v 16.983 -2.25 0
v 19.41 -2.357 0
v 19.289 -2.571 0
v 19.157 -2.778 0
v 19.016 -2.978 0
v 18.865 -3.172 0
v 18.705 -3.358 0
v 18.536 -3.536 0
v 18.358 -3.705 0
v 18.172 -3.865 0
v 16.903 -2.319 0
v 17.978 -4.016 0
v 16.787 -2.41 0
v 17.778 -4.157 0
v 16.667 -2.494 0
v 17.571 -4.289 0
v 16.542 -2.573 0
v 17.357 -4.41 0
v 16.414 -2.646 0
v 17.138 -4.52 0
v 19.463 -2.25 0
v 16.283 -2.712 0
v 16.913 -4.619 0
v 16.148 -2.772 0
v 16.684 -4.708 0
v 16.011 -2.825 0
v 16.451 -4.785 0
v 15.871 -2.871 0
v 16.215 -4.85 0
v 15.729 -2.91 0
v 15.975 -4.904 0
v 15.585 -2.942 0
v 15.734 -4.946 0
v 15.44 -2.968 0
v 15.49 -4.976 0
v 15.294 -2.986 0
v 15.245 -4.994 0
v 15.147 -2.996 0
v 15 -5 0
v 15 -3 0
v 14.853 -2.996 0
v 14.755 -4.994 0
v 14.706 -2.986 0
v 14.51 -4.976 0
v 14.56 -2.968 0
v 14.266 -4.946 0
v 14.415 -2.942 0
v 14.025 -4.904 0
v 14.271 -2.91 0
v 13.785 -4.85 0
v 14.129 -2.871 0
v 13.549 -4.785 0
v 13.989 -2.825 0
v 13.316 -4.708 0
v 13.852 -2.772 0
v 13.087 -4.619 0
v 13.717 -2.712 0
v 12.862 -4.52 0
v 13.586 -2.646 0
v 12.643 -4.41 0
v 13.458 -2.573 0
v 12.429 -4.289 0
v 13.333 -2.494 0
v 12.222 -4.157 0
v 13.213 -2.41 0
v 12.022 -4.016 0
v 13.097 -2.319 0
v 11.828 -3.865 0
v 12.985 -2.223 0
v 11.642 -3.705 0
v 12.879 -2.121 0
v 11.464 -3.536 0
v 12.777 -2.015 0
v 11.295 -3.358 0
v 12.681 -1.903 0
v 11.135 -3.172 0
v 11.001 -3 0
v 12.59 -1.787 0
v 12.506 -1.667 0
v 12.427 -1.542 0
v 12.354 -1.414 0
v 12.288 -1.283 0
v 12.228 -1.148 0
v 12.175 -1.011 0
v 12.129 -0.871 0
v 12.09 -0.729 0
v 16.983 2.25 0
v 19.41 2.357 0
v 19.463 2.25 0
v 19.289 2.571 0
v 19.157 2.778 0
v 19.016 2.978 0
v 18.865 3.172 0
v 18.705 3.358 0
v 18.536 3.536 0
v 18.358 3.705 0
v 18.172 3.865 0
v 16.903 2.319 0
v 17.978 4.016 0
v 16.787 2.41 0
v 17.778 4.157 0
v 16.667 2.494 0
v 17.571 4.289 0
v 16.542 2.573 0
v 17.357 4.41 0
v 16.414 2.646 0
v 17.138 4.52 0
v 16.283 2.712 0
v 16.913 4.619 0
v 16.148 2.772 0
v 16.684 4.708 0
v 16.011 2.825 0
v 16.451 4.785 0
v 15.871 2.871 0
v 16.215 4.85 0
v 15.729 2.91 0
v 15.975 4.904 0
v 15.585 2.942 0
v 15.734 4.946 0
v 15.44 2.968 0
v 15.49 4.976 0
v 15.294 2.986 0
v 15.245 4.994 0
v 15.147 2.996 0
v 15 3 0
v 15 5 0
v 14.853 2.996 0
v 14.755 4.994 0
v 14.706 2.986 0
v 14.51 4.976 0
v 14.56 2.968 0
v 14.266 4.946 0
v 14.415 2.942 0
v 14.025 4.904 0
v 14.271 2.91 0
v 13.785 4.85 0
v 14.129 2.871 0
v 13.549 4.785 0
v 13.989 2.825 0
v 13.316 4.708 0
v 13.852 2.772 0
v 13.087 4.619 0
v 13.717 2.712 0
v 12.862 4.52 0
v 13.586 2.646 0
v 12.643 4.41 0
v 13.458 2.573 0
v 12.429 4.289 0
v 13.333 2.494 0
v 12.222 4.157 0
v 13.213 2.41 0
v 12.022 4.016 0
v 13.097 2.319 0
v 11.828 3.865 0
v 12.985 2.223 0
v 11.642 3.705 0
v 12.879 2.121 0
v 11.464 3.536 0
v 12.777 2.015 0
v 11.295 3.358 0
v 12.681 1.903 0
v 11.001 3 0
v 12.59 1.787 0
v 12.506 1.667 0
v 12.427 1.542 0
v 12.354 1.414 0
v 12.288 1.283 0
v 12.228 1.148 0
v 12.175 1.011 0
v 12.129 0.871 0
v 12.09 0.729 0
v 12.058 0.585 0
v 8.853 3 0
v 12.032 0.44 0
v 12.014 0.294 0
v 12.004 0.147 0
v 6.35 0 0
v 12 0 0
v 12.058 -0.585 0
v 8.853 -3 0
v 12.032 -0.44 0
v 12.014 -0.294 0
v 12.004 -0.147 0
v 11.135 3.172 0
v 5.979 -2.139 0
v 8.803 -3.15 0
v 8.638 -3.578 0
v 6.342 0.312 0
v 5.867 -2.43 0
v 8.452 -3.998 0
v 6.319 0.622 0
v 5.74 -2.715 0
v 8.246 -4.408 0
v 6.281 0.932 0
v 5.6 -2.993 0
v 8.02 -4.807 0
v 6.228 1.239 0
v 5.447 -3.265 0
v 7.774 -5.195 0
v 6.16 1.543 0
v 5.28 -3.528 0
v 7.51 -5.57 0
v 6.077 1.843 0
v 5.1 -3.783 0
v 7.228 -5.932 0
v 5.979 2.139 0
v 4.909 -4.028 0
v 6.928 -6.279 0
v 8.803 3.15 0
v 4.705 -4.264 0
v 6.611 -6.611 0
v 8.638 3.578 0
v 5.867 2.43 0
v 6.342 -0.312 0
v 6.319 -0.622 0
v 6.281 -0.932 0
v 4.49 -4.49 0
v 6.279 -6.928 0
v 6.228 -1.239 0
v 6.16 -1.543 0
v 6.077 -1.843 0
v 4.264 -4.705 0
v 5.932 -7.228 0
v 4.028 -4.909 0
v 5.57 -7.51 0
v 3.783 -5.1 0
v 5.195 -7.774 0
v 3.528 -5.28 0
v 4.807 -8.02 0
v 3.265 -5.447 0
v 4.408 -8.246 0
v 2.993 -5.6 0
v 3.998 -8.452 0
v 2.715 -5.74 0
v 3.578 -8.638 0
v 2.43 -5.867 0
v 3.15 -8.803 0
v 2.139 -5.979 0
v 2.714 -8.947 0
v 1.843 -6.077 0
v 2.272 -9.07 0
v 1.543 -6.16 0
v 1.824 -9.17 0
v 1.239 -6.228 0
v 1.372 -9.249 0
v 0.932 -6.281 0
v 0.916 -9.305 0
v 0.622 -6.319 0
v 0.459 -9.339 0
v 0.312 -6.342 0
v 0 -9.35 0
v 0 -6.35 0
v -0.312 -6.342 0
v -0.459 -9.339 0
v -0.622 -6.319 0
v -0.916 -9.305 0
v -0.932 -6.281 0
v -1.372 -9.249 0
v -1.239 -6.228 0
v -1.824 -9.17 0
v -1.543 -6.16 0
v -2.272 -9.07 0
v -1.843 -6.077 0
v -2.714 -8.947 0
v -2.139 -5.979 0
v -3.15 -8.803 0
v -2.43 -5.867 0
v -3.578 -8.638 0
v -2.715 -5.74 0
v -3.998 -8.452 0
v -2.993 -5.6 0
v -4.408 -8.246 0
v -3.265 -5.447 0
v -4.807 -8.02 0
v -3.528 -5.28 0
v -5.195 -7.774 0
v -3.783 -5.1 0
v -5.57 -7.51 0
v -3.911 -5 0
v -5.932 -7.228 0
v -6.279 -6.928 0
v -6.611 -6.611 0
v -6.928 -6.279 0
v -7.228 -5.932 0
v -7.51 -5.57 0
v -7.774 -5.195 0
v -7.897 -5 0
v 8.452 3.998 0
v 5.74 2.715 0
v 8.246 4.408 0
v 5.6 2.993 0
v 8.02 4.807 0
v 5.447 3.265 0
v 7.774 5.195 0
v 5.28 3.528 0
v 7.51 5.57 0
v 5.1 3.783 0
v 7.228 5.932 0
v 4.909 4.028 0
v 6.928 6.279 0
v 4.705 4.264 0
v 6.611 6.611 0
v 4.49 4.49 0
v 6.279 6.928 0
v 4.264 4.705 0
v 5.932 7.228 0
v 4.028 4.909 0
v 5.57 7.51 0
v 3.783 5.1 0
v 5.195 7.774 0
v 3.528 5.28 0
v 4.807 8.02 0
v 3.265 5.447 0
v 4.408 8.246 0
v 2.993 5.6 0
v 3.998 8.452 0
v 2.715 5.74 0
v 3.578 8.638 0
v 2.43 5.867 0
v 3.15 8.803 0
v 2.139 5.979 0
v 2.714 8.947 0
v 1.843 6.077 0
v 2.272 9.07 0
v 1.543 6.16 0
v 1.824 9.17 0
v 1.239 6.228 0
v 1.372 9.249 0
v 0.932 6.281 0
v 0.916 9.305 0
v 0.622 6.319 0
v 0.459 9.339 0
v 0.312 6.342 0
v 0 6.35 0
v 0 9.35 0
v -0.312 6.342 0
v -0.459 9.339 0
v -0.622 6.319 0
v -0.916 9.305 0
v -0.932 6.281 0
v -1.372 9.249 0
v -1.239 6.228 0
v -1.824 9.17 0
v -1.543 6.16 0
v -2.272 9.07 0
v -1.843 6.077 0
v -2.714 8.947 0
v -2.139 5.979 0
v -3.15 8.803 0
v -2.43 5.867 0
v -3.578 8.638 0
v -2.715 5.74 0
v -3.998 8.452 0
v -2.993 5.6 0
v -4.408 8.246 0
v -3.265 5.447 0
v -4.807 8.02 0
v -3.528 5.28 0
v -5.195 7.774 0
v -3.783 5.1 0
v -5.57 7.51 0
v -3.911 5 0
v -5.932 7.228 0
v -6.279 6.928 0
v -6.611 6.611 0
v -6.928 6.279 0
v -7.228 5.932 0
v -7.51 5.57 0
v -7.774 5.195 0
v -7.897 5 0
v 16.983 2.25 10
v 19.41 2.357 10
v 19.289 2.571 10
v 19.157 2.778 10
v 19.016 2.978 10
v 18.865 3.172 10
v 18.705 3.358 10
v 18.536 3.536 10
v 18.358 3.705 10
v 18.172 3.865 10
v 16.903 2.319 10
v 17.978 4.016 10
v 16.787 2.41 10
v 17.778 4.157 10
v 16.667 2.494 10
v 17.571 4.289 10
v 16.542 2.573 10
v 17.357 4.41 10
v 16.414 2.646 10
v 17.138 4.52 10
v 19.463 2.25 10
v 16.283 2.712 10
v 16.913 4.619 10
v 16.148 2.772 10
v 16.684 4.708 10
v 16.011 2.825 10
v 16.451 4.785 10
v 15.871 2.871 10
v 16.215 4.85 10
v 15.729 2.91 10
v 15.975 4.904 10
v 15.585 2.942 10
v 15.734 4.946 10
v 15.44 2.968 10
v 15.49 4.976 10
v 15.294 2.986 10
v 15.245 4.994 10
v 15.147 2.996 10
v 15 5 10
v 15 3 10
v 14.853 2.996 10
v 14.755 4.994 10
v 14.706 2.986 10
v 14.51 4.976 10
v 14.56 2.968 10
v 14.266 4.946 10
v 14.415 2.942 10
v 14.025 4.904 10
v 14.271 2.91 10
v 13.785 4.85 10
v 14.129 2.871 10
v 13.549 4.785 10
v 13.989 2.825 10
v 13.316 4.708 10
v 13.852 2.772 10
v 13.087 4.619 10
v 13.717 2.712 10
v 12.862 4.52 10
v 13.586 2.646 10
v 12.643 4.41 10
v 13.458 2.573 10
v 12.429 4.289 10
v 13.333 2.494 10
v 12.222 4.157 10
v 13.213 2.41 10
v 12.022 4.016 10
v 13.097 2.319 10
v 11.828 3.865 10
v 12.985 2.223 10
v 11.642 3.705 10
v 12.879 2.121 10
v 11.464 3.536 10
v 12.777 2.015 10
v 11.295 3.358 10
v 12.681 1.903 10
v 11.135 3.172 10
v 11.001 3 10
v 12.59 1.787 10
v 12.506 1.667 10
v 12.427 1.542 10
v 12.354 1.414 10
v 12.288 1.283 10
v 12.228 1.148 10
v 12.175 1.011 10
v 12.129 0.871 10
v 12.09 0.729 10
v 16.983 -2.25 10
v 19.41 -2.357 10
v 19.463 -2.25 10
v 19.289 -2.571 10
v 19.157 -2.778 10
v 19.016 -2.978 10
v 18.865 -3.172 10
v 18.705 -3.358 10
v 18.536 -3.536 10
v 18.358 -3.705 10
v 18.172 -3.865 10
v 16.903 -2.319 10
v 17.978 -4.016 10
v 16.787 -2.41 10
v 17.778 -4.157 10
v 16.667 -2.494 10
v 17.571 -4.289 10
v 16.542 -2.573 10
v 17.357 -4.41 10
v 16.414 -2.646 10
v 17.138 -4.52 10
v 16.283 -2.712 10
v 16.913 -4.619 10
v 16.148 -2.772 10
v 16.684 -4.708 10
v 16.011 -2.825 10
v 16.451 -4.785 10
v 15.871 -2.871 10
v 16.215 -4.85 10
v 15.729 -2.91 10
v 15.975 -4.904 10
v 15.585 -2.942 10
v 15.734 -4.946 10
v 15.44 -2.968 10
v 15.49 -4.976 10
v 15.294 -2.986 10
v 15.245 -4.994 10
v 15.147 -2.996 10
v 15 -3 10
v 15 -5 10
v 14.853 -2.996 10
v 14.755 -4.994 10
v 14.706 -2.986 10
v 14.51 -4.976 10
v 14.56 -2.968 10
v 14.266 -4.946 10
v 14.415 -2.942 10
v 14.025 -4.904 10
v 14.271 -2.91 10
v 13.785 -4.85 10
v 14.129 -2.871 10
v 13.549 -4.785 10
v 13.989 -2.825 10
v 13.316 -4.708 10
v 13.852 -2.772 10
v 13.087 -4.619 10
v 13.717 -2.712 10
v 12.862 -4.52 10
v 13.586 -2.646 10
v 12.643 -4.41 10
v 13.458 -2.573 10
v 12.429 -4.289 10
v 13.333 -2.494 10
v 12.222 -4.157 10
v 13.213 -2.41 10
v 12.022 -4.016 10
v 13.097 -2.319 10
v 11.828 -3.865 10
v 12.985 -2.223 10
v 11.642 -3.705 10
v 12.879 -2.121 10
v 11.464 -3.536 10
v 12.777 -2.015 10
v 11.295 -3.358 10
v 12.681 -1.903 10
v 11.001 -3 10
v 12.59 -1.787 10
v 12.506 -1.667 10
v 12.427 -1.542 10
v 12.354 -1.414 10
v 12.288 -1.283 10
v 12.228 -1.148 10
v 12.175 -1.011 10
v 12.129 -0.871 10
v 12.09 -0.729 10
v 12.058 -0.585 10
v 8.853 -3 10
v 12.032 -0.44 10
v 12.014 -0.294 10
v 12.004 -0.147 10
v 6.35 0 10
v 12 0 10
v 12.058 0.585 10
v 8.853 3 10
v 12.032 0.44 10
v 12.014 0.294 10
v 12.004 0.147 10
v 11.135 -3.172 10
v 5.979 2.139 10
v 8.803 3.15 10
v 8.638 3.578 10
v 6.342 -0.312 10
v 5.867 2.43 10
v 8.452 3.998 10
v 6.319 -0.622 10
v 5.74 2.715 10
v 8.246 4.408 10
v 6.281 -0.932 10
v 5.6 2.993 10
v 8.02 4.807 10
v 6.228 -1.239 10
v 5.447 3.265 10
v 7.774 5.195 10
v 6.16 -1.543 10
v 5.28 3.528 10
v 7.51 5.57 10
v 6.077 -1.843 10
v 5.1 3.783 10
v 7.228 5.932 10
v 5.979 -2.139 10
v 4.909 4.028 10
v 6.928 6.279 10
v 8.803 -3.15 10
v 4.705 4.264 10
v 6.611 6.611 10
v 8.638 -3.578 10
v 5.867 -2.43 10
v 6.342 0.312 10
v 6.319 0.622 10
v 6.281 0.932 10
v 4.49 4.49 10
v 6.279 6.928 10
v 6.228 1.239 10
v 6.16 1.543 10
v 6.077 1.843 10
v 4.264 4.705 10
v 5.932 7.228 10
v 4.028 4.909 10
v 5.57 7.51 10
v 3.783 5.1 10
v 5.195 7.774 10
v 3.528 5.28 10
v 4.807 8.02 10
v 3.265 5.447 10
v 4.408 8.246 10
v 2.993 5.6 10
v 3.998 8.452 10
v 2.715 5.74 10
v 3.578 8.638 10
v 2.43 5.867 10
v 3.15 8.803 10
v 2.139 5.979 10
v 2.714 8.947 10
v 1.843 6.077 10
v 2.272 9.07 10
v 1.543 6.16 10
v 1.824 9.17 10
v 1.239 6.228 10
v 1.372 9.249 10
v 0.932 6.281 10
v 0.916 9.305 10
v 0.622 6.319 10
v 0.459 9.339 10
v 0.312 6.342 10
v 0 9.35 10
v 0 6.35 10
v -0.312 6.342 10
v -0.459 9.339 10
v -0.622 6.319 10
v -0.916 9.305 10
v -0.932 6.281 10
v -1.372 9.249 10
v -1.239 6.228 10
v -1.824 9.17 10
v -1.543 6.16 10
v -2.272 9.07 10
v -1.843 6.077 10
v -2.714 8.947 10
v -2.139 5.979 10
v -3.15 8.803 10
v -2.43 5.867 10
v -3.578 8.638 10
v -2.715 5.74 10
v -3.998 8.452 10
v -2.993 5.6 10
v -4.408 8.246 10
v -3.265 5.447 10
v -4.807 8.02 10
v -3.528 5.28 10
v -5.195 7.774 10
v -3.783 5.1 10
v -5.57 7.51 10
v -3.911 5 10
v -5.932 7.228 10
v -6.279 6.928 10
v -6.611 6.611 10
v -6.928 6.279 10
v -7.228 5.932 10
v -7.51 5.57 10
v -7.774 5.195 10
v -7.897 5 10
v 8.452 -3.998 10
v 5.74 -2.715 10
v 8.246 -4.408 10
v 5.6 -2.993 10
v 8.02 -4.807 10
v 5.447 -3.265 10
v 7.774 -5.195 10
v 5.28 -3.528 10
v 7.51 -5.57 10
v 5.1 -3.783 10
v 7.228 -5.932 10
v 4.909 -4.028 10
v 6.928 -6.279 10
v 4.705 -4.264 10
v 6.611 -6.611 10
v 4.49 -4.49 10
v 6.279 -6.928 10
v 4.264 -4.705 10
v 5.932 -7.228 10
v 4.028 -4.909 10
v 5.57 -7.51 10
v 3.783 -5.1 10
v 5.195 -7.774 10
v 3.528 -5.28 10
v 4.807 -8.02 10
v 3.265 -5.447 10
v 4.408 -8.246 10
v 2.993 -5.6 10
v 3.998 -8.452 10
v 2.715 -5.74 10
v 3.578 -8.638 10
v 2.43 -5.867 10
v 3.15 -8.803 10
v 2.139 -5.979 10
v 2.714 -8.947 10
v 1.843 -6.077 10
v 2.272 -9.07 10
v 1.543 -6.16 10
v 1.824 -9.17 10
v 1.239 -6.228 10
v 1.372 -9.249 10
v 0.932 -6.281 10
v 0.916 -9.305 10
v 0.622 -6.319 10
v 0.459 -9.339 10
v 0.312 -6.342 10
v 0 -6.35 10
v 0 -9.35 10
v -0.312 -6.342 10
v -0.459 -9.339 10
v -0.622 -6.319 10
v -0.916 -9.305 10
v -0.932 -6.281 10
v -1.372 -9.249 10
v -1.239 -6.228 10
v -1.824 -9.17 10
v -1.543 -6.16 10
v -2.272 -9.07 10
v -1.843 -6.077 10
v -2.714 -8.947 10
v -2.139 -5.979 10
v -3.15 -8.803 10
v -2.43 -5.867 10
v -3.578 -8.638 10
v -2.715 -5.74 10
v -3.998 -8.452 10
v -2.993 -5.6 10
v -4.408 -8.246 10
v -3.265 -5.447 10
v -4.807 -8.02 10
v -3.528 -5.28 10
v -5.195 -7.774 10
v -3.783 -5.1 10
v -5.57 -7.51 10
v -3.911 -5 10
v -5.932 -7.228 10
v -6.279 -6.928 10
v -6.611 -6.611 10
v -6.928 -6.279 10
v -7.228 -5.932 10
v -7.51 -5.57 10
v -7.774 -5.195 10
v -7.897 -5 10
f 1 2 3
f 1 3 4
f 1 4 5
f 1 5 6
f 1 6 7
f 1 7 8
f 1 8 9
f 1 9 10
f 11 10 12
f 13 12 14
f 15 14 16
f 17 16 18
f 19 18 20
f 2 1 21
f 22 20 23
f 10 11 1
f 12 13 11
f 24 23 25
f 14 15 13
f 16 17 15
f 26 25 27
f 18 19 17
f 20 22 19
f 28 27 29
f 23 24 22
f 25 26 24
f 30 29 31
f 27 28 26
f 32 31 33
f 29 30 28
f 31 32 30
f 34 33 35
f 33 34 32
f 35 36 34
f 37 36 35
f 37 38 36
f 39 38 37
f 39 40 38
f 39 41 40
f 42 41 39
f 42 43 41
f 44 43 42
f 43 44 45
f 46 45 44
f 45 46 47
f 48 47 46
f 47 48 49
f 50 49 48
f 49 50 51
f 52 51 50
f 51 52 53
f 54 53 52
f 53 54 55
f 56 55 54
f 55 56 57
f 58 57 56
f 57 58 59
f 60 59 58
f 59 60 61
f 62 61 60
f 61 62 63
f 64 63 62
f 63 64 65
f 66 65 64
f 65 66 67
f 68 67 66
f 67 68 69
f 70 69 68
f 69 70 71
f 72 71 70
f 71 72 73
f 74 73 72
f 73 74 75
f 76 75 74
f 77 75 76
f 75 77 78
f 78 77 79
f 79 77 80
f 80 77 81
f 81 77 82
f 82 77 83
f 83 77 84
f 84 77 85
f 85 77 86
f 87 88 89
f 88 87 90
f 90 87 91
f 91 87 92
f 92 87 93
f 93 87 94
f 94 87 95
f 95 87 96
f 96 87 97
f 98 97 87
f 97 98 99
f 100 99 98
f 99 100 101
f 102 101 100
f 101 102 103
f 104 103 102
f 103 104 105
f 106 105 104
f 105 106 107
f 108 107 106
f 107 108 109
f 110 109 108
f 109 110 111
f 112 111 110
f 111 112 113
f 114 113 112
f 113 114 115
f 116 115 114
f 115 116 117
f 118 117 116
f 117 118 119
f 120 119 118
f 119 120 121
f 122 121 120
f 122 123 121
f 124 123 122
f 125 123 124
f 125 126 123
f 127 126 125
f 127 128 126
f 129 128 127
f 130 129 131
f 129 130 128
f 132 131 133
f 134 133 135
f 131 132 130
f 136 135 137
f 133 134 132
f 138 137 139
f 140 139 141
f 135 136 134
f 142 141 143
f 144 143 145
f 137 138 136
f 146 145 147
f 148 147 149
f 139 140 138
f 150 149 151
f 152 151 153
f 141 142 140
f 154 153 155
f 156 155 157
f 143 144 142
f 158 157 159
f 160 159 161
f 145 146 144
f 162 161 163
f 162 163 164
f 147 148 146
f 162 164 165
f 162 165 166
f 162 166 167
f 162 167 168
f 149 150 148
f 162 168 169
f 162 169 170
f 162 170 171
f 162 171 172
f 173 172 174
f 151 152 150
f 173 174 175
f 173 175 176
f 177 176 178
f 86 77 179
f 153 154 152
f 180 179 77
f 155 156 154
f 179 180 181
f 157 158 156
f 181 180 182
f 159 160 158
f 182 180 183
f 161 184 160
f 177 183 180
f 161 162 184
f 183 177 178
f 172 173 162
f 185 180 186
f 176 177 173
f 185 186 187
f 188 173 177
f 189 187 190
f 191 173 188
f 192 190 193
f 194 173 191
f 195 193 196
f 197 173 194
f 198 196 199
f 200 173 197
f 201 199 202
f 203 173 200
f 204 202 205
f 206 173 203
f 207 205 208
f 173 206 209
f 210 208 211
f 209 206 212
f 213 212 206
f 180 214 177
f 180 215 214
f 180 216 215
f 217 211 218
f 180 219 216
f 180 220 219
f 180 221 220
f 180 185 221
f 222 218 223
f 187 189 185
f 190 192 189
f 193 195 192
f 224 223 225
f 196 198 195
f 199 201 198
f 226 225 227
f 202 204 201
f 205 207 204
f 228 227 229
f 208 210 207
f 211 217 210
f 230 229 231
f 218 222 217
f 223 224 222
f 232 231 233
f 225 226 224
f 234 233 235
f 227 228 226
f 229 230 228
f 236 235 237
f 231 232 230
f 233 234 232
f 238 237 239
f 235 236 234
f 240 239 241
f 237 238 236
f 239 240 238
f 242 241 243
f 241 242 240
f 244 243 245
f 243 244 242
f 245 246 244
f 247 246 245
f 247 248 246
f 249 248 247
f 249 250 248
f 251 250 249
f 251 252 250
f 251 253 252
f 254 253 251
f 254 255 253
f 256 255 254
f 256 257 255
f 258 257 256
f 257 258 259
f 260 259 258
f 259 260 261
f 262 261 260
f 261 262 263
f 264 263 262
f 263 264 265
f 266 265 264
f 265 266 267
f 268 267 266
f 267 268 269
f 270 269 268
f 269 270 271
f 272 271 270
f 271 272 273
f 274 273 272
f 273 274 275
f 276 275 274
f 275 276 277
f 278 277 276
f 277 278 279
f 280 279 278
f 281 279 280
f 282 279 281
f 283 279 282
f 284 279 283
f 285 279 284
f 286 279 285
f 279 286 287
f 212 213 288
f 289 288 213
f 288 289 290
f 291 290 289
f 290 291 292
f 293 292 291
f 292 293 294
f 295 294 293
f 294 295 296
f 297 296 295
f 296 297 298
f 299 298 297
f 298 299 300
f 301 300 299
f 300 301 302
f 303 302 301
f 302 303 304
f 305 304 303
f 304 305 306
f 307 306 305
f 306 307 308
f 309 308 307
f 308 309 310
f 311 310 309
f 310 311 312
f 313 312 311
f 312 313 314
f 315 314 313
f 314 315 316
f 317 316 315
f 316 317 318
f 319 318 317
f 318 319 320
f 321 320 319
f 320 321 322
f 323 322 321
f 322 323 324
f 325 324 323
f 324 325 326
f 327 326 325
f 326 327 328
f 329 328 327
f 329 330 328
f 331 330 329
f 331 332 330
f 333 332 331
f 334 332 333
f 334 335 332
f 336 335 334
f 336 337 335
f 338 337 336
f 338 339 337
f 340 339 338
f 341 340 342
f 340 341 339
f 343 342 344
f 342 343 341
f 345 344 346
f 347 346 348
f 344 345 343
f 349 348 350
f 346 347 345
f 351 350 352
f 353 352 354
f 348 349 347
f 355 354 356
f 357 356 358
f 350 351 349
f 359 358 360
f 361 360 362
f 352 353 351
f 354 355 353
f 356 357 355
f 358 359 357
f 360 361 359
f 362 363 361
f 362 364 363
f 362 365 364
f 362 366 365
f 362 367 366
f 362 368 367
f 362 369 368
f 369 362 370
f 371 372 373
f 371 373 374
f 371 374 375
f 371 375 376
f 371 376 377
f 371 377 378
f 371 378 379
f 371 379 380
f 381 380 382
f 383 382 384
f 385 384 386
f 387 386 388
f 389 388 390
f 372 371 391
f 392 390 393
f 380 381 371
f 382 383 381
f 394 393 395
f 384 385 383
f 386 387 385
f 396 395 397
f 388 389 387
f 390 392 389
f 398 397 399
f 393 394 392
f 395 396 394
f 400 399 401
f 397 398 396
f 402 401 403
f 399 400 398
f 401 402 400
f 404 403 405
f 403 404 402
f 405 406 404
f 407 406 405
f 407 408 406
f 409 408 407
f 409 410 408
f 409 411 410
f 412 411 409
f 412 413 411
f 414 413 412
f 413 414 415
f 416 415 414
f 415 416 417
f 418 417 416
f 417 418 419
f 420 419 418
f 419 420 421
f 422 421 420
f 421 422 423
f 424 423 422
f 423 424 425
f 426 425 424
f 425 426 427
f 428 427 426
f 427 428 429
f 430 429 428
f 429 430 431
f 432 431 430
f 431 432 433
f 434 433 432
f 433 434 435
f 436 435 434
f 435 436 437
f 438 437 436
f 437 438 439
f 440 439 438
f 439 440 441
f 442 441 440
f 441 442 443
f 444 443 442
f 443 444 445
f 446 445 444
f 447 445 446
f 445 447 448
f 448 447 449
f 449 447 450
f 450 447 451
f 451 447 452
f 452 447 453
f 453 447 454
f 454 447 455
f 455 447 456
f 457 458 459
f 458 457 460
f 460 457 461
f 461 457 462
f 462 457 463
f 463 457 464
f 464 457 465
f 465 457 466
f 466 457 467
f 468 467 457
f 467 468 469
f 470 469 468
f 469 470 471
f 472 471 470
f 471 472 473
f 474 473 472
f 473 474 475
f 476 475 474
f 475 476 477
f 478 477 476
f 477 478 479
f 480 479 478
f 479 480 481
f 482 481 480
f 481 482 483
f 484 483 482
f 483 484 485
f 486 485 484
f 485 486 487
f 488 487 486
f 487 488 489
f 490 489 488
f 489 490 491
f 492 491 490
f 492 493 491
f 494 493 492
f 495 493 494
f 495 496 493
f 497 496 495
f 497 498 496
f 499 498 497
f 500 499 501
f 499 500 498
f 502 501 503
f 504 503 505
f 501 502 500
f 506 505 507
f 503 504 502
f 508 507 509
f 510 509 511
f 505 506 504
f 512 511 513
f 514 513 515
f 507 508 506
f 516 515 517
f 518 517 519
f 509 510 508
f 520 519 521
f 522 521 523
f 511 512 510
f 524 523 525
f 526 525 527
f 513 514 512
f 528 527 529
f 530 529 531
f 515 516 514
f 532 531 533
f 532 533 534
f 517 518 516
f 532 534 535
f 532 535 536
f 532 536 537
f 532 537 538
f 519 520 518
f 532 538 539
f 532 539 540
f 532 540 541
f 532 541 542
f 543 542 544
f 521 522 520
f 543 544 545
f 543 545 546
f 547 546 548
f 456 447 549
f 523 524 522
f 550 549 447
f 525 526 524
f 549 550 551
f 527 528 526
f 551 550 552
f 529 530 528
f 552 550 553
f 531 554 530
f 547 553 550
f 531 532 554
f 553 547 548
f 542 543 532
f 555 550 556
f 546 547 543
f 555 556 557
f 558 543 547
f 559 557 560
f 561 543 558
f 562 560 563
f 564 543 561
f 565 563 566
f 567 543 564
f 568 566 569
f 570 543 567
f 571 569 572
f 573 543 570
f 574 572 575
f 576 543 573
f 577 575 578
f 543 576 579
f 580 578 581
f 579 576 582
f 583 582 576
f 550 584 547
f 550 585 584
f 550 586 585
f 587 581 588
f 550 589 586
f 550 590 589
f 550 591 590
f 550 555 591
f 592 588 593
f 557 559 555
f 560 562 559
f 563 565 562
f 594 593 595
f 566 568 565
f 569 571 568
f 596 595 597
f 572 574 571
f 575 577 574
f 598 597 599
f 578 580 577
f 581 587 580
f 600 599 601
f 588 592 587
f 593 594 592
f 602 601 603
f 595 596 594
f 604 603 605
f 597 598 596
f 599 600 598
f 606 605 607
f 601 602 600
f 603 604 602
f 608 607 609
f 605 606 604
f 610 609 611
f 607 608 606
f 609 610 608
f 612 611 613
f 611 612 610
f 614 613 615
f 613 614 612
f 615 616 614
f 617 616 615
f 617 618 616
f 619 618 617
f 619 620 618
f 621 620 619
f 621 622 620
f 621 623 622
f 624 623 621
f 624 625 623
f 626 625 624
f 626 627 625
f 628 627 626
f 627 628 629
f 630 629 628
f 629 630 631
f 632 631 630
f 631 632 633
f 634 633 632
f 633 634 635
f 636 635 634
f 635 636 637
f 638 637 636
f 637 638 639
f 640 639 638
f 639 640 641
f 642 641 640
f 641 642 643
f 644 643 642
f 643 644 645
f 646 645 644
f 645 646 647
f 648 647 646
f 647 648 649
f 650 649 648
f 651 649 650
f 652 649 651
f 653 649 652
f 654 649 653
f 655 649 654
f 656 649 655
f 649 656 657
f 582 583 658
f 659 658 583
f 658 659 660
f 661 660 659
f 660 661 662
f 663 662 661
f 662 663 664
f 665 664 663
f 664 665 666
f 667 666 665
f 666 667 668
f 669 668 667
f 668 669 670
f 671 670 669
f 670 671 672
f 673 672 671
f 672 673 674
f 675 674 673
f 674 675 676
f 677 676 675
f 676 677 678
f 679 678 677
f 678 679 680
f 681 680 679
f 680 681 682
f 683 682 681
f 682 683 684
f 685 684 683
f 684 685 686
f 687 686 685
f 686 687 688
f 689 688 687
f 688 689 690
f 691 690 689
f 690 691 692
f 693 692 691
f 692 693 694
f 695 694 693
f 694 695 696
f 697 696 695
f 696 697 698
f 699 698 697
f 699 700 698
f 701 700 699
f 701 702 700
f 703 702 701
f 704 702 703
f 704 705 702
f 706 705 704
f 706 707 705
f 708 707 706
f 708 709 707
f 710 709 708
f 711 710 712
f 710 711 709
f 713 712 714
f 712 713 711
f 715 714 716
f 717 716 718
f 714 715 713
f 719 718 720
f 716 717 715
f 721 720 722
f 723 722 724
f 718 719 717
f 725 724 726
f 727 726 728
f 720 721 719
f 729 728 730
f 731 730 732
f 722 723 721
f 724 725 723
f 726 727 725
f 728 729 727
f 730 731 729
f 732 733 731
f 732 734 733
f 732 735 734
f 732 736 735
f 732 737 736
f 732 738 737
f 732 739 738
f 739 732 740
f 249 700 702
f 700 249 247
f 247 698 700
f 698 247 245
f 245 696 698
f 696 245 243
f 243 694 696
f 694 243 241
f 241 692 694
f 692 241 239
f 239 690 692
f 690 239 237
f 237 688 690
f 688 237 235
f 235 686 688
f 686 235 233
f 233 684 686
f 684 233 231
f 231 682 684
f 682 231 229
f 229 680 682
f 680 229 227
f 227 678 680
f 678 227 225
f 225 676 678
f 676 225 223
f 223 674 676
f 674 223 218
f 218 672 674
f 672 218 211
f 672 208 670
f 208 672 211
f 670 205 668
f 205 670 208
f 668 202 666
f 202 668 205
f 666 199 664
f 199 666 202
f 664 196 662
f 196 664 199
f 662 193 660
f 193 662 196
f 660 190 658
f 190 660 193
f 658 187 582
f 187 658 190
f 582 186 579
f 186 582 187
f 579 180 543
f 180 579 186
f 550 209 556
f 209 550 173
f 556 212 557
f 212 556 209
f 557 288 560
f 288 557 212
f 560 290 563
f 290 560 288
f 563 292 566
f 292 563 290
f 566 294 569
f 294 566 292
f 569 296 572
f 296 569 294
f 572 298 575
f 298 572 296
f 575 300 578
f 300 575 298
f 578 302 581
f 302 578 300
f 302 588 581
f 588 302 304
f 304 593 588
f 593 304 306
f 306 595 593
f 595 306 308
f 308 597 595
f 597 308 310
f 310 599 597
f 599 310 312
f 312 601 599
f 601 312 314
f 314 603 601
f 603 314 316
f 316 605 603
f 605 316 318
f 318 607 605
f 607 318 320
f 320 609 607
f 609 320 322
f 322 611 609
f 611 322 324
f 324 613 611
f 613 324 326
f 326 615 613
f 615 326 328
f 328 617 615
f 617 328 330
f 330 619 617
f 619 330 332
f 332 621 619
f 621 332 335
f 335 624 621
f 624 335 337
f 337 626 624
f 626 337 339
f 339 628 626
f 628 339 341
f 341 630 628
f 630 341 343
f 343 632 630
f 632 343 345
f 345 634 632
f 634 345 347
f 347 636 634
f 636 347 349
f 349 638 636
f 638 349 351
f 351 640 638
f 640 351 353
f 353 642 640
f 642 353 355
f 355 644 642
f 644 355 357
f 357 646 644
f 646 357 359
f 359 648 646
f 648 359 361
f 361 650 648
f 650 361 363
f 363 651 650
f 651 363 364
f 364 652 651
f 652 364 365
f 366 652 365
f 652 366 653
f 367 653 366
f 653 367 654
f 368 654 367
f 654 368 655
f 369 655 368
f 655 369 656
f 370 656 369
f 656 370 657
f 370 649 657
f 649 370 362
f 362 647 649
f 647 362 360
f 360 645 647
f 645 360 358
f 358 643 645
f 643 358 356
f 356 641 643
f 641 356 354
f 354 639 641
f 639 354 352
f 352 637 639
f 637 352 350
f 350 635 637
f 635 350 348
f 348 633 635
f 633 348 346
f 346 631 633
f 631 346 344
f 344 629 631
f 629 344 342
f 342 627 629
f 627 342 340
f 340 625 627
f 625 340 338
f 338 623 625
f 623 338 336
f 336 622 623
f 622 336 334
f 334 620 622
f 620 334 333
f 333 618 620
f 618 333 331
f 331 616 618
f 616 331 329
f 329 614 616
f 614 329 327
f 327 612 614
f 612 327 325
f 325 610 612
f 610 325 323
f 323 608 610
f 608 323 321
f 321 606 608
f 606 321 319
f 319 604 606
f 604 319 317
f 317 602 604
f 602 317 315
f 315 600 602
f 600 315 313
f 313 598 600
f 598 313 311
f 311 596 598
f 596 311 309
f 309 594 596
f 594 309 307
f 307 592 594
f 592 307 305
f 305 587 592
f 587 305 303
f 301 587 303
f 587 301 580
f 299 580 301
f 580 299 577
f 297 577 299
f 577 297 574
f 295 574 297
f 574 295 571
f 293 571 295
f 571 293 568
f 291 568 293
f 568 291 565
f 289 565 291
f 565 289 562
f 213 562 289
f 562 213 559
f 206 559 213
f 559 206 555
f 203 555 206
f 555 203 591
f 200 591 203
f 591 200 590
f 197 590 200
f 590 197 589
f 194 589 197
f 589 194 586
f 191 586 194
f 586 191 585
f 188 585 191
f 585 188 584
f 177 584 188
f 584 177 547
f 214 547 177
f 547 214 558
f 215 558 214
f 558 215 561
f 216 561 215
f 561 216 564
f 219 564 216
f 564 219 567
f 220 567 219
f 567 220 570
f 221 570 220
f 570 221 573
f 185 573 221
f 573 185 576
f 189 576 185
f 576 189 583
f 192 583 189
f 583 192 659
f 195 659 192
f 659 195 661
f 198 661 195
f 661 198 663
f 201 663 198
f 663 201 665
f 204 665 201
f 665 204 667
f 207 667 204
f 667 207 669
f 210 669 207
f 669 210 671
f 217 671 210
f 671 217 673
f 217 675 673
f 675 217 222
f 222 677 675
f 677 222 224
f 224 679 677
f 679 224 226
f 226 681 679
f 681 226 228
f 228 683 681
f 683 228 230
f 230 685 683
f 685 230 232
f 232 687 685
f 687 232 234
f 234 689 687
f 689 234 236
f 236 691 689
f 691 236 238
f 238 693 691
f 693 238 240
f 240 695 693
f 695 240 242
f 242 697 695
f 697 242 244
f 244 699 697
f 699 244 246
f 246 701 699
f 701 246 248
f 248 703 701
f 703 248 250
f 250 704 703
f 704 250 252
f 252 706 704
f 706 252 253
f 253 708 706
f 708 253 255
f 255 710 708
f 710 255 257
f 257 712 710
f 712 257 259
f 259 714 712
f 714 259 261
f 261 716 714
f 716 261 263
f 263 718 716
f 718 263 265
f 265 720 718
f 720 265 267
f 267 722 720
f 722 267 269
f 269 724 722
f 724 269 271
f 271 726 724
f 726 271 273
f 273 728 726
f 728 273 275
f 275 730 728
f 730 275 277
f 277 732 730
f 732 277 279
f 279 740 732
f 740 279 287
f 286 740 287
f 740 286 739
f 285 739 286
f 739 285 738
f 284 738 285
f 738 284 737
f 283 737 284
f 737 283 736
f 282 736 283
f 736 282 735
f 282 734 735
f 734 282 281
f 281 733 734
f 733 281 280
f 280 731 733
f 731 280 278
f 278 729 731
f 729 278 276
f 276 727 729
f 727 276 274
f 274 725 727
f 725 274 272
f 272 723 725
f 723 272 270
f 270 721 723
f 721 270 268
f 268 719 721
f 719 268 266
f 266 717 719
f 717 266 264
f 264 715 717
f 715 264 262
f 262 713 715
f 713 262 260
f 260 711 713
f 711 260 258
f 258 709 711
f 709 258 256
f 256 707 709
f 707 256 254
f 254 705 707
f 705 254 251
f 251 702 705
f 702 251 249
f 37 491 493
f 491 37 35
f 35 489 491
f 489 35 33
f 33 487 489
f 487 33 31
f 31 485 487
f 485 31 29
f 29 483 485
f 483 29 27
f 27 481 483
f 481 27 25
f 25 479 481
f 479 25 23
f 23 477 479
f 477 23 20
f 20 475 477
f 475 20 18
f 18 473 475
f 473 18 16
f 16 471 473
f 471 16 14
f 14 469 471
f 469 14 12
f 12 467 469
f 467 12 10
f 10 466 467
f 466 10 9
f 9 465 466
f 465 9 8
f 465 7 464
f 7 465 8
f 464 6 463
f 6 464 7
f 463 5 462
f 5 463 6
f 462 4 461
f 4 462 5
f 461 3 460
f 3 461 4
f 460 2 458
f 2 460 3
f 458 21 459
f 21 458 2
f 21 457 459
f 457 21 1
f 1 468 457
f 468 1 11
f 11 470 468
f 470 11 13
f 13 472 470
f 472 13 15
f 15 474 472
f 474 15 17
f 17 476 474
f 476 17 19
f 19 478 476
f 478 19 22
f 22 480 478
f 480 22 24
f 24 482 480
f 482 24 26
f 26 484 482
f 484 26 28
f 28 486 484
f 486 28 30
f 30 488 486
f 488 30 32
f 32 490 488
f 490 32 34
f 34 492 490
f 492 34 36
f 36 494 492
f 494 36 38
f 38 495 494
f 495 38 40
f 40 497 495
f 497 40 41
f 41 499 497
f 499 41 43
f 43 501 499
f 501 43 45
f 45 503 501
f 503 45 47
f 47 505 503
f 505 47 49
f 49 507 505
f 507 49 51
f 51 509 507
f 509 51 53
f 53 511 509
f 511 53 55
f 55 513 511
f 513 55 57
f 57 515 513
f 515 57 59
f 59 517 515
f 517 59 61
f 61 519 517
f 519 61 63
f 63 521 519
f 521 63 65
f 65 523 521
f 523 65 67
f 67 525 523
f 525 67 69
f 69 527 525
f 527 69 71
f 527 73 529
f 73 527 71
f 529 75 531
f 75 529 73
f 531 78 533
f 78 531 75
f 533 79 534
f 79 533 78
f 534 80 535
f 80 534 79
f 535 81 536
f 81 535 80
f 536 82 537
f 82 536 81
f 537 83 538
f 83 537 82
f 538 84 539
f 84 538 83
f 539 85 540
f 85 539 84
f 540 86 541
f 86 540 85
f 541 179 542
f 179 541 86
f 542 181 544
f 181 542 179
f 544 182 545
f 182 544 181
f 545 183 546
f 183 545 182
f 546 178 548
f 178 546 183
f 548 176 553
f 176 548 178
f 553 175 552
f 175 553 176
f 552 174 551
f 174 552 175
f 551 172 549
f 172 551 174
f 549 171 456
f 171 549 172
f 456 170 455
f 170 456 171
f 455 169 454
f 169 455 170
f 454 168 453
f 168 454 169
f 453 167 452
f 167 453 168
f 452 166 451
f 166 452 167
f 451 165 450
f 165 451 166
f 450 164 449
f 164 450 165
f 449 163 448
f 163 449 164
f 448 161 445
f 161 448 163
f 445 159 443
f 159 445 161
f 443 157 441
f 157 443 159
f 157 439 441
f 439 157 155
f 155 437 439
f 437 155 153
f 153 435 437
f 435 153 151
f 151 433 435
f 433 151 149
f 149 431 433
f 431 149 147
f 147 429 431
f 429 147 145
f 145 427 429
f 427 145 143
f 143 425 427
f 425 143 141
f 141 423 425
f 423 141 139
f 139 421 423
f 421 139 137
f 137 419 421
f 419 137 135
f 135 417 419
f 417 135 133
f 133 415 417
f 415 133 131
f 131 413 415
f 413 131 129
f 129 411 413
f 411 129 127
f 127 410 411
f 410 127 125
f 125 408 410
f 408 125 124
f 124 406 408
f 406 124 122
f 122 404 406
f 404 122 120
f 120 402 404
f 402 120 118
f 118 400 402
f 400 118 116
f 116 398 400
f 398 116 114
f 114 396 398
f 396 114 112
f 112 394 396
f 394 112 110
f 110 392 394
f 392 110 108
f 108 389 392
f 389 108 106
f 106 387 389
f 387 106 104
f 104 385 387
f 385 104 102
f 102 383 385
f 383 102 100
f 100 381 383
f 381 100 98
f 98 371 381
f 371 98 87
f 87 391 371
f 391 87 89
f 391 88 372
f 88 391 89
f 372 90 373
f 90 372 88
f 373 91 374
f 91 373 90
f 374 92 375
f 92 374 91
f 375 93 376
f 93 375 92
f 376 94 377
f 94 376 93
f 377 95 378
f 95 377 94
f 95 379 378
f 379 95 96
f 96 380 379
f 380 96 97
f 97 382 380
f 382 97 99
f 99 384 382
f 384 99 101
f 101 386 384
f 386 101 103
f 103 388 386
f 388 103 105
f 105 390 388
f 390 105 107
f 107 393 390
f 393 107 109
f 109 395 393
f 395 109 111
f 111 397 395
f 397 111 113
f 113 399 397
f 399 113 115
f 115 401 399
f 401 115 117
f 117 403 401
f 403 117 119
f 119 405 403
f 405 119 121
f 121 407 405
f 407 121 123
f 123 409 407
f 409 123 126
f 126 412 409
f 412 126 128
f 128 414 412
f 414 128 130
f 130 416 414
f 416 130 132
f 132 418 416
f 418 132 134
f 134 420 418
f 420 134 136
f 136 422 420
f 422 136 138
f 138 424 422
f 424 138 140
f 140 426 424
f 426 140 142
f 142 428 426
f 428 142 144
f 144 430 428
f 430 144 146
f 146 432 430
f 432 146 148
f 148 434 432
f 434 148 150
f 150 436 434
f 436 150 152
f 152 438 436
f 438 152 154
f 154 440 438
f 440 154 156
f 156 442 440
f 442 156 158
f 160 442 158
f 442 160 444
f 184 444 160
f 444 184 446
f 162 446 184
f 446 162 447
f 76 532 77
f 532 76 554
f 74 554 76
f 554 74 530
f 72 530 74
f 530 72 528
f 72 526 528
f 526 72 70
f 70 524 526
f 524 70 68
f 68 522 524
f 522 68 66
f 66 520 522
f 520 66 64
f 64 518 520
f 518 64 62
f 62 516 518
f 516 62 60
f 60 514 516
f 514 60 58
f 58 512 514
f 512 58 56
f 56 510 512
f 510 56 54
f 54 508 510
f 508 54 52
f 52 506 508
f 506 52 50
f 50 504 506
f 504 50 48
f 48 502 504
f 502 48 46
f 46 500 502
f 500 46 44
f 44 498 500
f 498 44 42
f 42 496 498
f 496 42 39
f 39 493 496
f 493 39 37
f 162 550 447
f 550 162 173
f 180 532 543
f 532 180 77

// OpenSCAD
// ---------- Parameters ----------
$fn = 128;                       // smoothness for circles
height = 10;                     // extrusion height (mm)

// Rod ring
rod_inner_d = 12.7;              // inner diameter of rod ring (mm)
rod_wall = 3;                    // wall thickness of rod ring (mm)
rod_outer_d = rod_inner_d + 2*rod_wall; // outer diameter (mm)
rod_open_width = 10;             // opening width on -X side (mm)

// Tubing ring
tube_inner_d = 6;                // inner diameter of tubing ring (mm)
tube_wall = 2;                   // wall thickness of tubing ring (mm)
tube_outer_d = tube_inner_d + 2*tube_wall; // outer diameter (mm)
tube_center_x = 15;              // X position of tubing ring centre (mm)
tube_open_width = 4.5;           // opening width on +X side (mm)

// Bridge
bridge_x_start = 8;              // start X of bridge (mm)
bridge_x_end = 12;               // end X of bridge (mm)
bridge_y_width = 6;              // bridge width in Y (mm)

// ---------- Modules ----------
module rod_ring() {
    linear_extrude(height) {
        // 2‑D ring with opening on the -X side
        difference() {
            // outer circle minus inner circle
            difference() {
                circle(d = rod_outer_d);
                circle(d = rod_inner_d);
            }
            // opening cut (extends far beyond the ring)
            translate([-200, -rod_open_width/2])
                square([200, rod_open_width]); // x < 0 region
        }
    }
}

module tube_ring() {
    translate([tube_center_x, 0]) {
        linear_extrude(height) {
            // 2‑D ring with opening on the +X side
            difference() {
                // outer circle minus inner circle
                difference() {
                    circle(d = tube_outer_d);
                    circle(d = tube_inner_d);
                }
                // opening cut (extends far beyond the ring)
                translate([0, -tube_open_width/2])
                    square([200, tube_open_width]); // x > 0 region
            }
        }
    }
}

module bridge() {
    linear_extrude(height) {
        // rectangular bridge between the two rings
        translate([bridge_x_start, -bridge_y_width/2])
            square([bridge_x_end - bridge_x_start, bridge_y_width]);
    }
}

// ---------- Assembly ----------
union() {
    rod_ring();
    tube_ring();
    bridge();
}
